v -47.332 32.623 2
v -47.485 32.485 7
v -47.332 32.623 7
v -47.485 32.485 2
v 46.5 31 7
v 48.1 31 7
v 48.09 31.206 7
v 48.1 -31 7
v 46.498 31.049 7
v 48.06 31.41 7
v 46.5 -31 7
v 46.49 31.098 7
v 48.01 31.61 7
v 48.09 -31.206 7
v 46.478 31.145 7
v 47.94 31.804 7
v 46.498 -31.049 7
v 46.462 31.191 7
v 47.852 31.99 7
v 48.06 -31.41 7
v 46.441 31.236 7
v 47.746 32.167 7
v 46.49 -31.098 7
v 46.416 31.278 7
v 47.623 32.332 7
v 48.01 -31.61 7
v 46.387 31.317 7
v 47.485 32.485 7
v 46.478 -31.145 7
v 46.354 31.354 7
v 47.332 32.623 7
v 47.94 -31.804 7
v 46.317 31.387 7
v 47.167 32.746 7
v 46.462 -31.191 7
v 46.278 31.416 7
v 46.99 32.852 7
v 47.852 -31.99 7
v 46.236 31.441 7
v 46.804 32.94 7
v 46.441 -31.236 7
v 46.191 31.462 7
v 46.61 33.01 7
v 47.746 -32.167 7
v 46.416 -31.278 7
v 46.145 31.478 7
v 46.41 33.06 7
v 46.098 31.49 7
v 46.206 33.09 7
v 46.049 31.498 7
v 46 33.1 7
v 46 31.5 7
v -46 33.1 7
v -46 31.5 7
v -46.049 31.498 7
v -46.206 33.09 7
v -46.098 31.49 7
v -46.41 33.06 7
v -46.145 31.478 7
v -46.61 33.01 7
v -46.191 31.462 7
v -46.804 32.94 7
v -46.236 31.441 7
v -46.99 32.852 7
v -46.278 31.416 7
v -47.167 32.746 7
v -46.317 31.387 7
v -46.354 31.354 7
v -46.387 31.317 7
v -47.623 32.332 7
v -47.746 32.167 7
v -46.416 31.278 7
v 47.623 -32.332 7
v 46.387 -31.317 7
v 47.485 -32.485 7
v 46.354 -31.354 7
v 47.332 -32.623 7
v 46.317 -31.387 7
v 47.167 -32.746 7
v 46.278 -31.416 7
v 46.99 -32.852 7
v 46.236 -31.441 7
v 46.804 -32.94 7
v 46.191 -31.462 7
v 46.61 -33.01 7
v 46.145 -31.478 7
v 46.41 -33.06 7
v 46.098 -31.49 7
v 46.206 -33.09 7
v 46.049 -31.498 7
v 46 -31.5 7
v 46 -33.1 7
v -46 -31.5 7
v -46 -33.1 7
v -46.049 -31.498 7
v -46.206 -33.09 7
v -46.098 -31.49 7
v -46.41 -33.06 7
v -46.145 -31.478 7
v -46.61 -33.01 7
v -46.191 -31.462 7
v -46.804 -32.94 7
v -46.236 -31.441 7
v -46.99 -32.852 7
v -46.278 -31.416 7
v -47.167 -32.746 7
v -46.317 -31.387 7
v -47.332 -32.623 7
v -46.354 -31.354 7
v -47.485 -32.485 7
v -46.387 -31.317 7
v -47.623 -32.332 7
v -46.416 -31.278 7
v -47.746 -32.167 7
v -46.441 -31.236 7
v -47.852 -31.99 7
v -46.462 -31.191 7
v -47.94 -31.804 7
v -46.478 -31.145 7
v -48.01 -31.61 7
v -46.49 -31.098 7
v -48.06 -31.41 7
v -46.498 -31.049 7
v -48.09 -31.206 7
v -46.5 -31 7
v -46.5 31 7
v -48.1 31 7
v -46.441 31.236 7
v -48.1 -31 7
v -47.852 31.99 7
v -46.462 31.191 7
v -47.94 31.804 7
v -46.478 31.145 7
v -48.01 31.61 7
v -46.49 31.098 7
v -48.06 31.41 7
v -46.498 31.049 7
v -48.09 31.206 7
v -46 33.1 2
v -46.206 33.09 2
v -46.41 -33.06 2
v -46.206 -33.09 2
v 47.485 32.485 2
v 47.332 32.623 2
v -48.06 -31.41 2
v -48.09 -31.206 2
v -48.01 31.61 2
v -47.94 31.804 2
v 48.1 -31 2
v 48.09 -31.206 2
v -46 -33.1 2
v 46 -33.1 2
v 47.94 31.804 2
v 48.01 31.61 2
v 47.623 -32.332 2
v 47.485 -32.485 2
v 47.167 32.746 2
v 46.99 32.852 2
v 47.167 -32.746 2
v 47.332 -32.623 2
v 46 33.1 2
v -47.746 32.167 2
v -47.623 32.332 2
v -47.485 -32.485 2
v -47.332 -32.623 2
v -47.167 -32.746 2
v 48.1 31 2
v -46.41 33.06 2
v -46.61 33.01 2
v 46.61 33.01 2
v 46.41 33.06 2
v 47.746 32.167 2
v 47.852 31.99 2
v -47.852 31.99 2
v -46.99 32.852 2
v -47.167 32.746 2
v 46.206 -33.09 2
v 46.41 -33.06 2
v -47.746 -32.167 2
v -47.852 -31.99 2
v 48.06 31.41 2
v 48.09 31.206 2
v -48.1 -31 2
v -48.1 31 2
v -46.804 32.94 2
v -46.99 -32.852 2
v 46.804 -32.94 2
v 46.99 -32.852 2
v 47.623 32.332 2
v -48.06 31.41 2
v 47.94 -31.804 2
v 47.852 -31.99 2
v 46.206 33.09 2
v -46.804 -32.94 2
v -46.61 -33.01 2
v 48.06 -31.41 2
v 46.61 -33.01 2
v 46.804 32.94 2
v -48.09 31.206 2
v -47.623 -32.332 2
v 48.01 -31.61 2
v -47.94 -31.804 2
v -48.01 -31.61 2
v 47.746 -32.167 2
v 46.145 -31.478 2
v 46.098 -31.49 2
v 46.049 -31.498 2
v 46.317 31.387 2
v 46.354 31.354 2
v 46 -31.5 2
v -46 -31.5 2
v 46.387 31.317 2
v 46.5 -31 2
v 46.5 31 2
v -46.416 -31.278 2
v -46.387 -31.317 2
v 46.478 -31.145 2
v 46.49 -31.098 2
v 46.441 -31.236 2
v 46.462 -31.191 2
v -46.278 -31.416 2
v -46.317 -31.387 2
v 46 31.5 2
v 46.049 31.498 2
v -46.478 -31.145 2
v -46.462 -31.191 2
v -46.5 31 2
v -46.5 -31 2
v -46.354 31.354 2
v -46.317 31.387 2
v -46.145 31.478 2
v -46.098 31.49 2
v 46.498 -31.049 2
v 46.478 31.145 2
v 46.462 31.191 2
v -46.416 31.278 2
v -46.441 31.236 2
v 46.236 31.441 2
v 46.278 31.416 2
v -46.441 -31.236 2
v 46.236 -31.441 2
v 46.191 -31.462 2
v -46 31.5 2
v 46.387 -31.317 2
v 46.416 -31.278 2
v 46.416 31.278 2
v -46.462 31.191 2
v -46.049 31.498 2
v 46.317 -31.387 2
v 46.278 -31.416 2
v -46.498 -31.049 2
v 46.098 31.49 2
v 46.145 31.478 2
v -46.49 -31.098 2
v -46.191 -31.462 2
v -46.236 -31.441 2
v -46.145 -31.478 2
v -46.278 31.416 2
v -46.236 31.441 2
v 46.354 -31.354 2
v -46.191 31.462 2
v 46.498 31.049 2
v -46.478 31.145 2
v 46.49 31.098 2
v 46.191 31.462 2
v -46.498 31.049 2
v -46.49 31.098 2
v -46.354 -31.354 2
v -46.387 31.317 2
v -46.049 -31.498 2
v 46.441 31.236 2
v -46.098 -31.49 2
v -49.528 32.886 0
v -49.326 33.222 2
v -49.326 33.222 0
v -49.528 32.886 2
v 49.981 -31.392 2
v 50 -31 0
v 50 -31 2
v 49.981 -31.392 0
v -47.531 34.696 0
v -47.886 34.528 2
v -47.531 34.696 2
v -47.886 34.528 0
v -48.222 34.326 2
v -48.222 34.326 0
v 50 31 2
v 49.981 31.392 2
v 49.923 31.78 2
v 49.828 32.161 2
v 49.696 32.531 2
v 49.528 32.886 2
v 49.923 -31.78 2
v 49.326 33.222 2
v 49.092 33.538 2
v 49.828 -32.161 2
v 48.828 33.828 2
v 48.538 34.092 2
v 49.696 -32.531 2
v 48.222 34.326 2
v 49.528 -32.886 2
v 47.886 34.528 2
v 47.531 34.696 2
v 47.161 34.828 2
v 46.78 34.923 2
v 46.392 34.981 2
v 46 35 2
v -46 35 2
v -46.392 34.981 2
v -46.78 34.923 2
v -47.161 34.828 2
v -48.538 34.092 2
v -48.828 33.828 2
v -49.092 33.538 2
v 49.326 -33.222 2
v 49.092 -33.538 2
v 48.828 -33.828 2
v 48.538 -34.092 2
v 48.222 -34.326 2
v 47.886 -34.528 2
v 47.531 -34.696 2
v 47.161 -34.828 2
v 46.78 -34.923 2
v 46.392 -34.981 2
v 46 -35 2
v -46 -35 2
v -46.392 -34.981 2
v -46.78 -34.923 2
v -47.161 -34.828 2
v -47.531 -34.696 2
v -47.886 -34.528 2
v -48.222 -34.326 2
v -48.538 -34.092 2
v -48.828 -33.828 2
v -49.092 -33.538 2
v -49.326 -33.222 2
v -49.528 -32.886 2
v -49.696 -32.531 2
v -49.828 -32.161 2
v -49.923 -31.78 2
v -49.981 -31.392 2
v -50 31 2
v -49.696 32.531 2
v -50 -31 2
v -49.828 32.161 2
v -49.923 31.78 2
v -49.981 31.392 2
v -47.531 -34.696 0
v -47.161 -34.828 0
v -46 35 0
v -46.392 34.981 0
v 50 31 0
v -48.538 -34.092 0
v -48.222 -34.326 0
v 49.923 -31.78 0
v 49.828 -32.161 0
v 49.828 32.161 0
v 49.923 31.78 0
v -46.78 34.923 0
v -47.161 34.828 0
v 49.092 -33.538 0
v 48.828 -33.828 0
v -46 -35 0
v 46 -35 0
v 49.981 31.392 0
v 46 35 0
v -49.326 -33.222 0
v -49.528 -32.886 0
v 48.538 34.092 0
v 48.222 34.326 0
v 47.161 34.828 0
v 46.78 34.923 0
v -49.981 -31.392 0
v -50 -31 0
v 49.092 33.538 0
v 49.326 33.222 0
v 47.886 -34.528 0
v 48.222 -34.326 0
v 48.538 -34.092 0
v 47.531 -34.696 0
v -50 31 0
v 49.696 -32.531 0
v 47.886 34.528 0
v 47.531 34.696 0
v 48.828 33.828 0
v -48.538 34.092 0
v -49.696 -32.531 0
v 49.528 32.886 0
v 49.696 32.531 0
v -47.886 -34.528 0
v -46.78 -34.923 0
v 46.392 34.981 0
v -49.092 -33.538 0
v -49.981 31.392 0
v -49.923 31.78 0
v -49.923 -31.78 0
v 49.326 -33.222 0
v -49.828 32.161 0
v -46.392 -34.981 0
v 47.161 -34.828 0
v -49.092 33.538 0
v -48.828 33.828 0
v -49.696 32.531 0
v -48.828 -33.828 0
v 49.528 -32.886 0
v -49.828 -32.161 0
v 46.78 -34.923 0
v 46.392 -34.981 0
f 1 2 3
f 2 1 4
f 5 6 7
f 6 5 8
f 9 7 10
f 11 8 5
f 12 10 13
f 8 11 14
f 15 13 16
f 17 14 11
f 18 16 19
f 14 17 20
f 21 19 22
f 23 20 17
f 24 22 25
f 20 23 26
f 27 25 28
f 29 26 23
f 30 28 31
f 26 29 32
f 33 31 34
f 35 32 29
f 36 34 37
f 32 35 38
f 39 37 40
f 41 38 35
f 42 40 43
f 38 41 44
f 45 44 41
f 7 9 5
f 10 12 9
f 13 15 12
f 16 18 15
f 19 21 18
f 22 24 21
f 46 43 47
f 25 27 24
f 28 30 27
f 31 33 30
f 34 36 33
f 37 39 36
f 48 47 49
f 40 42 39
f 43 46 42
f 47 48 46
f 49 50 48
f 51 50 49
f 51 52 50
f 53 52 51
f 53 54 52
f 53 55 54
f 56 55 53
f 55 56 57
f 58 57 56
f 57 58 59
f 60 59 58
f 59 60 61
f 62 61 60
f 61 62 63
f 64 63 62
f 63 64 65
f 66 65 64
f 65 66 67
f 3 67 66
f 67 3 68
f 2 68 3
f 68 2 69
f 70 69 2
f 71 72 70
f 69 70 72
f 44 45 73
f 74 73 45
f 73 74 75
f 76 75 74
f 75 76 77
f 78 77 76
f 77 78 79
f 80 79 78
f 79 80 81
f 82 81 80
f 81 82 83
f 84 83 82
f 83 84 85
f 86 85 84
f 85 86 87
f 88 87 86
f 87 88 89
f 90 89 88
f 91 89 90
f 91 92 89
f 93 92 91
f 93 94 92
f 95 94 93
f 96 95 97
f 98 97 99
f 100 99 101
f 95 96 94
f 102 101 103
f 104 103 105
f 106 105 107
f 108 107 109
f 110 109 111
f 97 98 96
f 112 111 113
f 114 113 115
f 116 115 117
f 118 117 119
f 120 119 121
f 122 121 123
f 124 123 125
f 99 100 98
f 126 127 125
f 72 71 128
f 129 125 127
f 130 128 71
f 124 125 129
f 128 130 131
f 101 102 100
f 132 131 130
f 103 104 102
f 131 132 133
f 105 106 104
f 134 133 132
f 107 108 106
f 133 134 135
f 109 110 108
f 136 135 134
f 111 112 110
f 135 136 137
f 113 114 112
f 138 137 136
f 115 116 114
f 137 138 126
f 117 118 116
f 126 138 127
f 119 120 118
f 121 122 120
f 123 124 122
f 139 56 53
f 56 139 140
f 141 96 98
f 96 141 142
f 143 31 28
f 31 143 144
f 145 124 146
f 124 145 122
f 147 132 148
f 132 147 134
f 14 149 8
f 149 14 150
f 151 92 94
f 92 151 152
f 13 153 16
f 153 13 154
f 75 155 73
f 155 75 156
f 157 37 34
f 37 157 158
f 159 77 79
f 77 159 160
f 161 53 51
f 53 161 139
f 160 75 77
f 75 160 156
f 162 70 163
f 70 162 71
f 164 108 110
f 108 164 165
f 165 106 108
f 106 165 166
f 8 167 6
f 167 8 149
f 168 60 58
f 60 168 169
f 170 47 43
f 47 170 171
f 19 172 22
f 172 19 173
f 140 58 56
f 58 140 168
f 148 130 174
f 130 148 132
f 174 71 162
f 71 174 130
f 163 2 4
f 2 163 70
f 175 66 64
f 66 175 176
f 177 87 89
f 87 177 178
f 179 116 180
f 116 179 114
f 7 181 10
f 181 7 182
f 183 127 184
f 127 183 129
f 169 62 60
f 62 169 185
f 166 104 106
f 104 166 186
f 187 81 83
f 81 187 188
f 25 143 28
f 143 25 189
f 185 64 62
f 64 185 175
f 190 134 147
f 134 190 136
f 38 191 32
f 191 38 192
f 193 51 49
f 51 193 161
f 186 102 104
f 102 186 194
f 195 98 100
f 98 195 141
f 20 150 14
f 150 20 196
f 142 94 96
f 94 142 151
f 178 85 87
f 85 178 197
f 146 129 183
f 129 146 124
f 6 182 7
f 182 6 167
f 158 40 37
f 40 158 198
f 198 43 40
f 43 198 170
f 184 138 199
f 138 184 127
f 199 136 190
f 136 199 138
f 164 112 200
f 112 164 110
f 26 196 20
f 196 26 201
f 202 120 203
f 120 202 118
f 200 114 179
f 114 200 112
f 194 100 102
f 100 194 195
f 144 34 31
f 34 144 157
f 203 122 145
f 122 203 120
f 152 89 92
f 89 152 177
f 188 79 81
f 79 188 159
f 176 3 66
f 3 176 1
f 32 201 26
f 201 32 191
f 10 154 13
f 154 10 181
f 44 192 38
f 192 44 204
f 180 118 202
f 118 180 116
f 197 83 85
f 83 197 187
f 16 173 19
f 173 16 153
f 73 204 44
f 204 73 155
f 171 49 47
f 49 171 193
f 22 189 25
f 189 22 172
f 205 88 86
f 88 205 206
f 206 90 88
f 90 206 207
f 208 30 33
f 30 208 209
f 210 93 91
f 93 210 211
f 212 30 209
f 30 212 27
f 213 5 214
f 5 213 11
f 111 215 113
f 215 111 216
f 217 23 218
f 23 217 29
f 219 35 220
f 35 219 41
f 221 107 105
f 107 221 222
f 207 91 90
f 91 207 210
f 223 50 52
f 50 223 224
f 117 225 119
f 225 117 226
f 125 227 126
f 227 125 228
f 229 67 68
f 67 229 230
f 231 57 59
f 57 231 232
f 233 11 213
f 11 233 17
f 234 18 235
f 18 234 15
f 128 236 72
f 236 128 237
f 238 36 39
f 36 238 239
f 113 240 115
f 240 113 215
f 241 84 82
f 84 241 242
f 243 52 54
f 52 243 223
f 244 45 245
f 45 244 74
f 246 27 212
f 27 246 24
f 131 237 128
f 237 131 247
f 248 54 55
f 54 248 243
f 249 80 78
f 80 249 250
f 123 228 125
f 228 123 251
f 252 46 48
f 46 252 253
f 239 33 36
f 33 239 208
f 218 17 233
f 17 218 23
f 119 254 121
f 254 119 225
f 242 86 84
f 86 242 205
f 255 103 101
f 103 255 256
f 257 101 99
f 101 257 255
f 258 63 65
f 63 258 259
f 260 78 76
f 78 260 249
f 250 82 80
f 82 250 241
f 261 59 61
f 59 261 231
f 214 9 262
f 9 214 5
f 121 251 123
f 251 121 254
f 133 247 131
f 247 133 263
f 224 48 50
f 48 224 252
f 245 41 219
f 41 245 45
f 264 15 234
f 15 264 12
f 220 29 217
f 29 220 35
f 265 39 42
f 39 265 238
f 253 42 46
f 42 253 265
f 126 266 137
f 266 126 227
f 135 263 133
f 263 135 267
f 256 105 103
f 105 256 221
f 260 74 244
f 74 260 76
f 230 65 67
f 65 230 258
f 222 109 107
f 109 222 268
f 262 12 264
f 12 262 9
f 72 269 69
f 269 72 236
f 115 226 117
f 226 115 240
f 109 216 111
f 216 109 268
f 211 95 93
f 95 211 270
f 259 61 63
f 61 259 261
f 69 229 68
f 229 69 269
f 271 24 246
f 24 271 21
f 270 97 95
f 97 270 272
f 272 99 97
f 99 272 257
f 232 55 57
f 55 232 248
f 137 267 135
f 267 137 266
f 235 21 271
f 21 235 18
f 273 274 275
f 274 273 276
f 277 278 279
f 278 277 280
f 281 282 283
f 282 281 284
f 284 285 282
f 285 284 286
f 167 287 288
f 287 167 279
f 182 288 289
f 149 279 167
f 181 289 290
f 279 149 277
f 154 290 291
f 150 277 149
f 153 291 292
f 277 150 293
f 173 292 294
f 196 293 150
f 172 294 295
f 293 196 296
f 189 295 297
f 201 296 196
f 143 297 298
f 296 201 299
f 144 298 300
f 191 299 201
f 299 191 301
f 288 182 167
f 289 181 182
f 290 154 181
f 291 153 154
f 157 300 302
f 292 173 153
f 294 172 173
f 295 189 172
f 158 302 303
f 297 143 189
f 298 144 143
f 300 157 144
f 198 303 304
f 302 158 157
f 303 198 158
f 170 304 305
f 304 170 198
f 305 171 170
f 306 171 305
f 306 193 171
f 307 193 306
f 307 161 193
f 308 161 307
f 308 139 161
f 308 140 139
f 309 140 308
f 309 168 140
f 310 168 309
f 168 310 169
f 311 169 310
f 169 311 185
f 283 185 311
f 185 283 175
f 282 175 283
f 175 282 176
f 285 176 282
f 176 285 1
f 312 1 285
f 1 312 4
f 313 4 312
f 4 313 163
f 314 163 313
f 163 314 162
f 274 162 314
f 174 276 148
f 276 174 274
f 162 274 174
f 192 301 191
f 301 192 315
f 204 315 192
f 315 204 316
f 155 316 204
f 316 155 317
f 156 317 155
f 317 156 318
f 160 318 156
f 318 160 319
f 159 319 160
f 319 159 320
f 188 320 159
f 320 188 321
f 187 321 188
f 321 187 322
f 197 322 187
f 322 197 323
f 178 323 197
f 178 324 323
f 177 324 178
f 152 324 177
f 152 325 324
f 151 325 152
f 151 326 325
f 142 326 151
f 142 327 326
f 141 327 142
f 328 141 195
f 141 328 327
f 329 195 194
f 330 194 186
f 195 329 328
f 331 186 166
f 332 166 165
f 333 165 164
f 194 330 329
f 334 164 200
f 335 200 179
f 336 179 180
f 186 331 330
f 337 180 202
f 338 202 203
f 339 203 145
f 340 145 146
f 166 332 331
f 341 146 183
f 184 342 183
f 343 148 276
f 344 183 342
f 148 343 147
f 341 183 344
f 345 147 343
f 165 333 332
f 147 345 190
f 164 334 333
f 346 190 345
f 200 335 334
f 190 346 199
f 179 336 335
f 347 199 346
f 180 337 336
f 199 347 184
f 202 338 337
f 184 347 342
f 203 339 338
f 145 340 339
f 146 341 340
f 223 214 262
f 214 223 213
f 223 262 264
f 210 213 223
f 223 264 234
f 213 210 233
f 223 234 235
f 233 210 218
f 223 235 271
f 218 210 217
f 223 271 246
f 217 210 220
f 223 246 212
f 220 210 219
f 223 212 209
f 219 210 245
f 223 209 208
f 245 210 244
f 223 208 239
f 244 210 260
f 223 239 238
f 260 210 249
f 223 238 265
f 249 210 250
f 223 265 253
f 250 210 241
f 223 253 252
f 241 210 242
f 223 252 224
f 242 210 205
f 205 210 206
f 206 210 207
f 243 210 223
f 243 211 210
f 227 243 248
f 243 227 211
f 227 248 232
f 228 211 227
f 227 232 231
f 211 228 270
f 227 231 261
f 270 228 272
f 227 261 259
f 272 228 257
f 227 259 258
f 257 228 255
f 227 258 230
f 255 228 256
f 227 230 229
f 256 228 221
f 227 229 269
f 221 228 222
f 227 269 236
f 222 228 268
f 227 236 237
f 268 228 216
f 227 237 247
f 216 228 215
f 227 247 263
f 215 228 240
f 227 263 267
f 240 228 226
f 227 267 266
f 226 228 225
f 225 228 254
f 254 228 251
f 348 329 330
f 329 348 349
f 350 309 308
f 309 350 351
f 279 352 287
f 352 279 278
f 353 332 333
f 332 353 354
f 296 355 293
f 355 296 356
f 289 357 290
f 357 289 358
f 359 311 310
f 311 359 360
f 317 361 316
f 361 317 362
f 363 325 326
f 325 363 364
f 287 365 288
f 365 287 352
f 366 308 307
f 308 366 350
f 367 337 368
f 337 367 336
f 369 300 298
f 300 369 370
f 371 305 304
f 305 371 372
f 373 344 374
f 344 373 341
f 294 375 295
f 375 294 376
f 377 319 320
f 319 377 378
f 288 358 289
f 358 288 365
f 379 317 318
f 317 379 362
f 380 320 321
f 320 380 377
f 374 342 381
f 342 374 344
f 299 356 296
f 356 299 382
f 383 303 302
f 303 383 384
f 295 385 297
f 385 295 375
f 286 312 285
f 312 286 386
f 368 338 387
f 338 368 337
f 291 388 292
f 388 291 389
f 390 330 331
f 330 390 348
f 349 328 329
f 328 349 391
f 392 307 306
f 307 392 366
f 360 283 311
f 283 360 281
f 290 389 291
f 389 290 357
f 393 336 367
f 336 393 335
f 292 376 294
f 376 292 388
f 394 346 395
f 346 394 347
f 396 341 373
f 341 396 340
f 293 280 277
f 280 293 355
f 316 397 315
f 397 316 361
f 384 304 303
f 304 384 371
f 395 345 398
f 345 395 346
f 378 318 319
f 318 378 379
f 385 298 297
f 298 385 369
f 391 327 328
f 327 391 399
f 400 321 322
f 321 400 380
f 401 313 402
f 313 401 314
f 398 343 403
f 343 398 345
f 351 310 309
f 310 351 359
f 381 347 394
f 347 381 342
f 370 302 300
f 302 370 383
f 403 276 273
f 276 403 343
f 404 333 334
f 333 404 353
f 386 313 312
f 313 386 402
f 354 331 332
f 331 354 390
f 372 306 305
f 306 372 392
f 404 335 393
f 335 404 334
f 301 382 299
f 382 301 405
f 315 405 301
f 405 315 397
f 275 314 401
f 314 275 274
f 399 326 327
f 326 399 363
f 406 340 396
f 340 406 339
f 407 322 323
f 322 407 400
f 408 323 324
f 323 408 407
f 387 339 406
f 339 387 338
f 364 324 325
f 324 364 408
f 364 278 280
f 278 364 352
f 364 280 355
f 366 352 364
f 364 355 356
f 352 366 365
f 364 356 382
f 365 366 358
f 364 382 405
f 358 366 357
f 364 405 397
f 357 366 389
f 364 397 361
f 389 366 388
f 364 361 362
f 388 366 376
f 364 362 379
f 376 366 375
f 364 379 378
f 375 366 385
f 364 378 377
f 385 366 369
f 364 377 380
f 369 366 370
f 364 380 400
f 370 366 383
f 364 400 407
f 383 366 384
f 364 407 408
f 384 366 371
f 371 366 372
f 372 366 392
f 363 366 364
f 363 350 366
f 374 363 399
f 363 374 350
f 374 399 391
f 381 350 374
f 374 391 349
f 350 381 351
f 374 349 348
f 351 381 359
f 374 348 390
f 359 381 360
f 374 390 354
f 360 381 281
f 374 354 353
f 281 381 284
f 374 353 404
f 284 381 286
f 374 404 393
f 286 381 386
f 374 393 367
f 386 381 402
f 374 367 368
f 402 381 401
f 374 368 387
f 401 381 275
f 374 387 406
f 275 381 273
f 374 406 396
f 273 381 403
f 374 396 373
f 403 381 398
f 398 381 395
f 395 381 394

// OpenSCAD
// file: _resistor_storage_box.scad
// =====================================
// Resistor storage box
// Open-top box that files resistor-kit bags on edge like index cards,
// plus a push-on lid. Sized to the issue's 10 x 7 x 7 cm outer envelope.
// =====================================
// Parts:
//   resistor_box     -> resistor_box.stl      (open-top box with end-wall thumb scoops)
//   resistor_box_lid -> resistor_box_lid.stl  (flat lid with an inner locating lip)
//
// Orientation: Z-up, centred on X/Y, base at z=0. The box prints floor-down
// as exported. The lid is modelled top-face-down (plate on the bed, lip
// rising from it) so it also prints flat without supports.
//
// Bag assumption: 1/4 W kit bags (~100 mm x 65 mm, ~2.5-3 mm thick with 20
// taped resistors) stand on their 100 mm edge along X and file across Y,
// so a 25-value kit fills the ~67 mm cavity width. The two end walls carry a
// U-shaped thumb scoop so a single bag's end can be pinched and lifted out,
// and so a thumb can push the fitted lid up from below.

$fn = 64;

// ---- Outer envelope (mm) ----
outer_l = 100;   // X: the bags' long edge lies along this
outer_w = 70;    // Y: bags file across this
outer_h = 70;    // Z: open-top box height, lid adds lid_t on top

// ---- Walls ----
wall     = 1.6;  // side wall thickness (4 perimeters at 0.4 mm)
floor_t  = 1.6;  // floor thickness
corner_r = 4;    // outer vertical corner radius

// ---- Thumb scoops in the two end (Y-Z) walls ----
scoops      = true;
scoop_w     = 26;  // scoop width across the end wall
scoop_depth = 22;  // scoop depth below the rim (>= scoop_w/2 for the round bottom)

// ---- Lid ----
lid_t         = 2;    // lid plate thickness
lip_h         = 5;    // how far the locating lip drops into the cavity
lip_t         = 1.6;  // lip wall thickness
lid_clearance = 0.3;  // per-side gap between the lip and the cavity wall

// ---- Derived ----
inner_l  = outer_l - 2 * wall;
inner_w  = outer_w - 2 * wall;
inner_r  = max(corner_r - wall, 0.5);
cavity_h = outer_h - floor_t;
lip_l    = inner_l - 2 * lid_clearance;
lip_w    = inner_w - 2 * lid_clearance;
lip_r    = max(inner_r - lid_clearance, 0.5);
// Clamp rather than assert on the raw customizer values: scoop_w and
// scoop_depth are bounded by outer_w/corner_r and cavity_h respectively, and
// those bounds shift independently of scoop_w/scoop_depth's own manifest
// ranges, so a hard assert can reject combinations that are each in-range.
eff_scoop_w     = min(scoop_w, outer_w - 2 * corner_r - 2);
eff_scoop_depth = min(scoop_depth, cavity_h - 10);
scoop_z0 = outer_h - eff_scoop_depth + eff_scoop_w / 2;  // centre of the scoop's round bottom

assert(!scoops || eff_scoop_depth >= eff_scoop_w / 2,
       "scoop_depth must be at least scoop_w/2 for the rounded bottom");
assert(lip_l > 2 * lip_t + 10 && lip_w > 2 * lip_t + 10,
       "box too small for the lid lip");

// Rounded-rectangle vertical prism: hull of four corner cylinders.
// l along X, w along Y, centred on X/Y, base at z=0.
module rbox(l, w, h, r) {
    hull()
        for (sx = [-1, 1], sy = [-1, 1])
            translate([sx * (l / 2 - r), sy * (w / 2 - r), 0])
                cylinder(r = r, h = h);
}

// U-shaped cutter for one end wall: a horizontal cylinder along X for the
// round bottom plus a block up past the rim. Centred on X/Y; the caller
// translates it onto the wall. Cuts wall + 2 mm along X.
module scoop_cutter() {
    translate([0, 0, scoop_z0])
        rotate([0, 90, 0])
            cylinder(d = eff_scoop_w, h = wall + 2, center = true);
    translate([-(wall + 2) / 2, -eff_scoop_w / 2, scoop_z0])
        cube([wall + 2, eff_scoop_w, outer_h - scoop_z0 + 1]);
}

// Open-top box, floor on the bed.
module resistor_box() {
    difference() {
        rbox(outer_l, outer_w, outer_h, corner_r);
        translate([0, 0, floor_t])
            rbox(inner_l, inner_w, cavity_h + 1, inner_r);
        if (scoops)
            for (sx = [-1, 1])
                translate([sx * (outer_l / 2 - wall / 2), 0, 0])
                    scoop_cutter();
    }
}

// Lid, modelled top-face-down: the plate sits on the bed and the lip
// rises from it; flip it over to fit the box.
module resistor_box_lid() {
    rbox(outer_l, outer_w, lid_t, corner_r);
    translate([0, 0, lid_t - 0.01])
        difference() {
            rbox(lip_l, lip_w, lip_h + 0.01, lip_r);
            translate([0, 0, -1])
                rbox(lip_l - 2 * lip_t, lip_w - 2 * lip_t, lip_h + 3,
                     max(lip_r - lip_t, 0.5));
        }
}
// main file
// Resistor storage box - push-on lid with an inner locating lip
// Render this file to generate resistor_box_lid.stl

include <_resistor_storage_box.scad>

resistor_box_lid();
